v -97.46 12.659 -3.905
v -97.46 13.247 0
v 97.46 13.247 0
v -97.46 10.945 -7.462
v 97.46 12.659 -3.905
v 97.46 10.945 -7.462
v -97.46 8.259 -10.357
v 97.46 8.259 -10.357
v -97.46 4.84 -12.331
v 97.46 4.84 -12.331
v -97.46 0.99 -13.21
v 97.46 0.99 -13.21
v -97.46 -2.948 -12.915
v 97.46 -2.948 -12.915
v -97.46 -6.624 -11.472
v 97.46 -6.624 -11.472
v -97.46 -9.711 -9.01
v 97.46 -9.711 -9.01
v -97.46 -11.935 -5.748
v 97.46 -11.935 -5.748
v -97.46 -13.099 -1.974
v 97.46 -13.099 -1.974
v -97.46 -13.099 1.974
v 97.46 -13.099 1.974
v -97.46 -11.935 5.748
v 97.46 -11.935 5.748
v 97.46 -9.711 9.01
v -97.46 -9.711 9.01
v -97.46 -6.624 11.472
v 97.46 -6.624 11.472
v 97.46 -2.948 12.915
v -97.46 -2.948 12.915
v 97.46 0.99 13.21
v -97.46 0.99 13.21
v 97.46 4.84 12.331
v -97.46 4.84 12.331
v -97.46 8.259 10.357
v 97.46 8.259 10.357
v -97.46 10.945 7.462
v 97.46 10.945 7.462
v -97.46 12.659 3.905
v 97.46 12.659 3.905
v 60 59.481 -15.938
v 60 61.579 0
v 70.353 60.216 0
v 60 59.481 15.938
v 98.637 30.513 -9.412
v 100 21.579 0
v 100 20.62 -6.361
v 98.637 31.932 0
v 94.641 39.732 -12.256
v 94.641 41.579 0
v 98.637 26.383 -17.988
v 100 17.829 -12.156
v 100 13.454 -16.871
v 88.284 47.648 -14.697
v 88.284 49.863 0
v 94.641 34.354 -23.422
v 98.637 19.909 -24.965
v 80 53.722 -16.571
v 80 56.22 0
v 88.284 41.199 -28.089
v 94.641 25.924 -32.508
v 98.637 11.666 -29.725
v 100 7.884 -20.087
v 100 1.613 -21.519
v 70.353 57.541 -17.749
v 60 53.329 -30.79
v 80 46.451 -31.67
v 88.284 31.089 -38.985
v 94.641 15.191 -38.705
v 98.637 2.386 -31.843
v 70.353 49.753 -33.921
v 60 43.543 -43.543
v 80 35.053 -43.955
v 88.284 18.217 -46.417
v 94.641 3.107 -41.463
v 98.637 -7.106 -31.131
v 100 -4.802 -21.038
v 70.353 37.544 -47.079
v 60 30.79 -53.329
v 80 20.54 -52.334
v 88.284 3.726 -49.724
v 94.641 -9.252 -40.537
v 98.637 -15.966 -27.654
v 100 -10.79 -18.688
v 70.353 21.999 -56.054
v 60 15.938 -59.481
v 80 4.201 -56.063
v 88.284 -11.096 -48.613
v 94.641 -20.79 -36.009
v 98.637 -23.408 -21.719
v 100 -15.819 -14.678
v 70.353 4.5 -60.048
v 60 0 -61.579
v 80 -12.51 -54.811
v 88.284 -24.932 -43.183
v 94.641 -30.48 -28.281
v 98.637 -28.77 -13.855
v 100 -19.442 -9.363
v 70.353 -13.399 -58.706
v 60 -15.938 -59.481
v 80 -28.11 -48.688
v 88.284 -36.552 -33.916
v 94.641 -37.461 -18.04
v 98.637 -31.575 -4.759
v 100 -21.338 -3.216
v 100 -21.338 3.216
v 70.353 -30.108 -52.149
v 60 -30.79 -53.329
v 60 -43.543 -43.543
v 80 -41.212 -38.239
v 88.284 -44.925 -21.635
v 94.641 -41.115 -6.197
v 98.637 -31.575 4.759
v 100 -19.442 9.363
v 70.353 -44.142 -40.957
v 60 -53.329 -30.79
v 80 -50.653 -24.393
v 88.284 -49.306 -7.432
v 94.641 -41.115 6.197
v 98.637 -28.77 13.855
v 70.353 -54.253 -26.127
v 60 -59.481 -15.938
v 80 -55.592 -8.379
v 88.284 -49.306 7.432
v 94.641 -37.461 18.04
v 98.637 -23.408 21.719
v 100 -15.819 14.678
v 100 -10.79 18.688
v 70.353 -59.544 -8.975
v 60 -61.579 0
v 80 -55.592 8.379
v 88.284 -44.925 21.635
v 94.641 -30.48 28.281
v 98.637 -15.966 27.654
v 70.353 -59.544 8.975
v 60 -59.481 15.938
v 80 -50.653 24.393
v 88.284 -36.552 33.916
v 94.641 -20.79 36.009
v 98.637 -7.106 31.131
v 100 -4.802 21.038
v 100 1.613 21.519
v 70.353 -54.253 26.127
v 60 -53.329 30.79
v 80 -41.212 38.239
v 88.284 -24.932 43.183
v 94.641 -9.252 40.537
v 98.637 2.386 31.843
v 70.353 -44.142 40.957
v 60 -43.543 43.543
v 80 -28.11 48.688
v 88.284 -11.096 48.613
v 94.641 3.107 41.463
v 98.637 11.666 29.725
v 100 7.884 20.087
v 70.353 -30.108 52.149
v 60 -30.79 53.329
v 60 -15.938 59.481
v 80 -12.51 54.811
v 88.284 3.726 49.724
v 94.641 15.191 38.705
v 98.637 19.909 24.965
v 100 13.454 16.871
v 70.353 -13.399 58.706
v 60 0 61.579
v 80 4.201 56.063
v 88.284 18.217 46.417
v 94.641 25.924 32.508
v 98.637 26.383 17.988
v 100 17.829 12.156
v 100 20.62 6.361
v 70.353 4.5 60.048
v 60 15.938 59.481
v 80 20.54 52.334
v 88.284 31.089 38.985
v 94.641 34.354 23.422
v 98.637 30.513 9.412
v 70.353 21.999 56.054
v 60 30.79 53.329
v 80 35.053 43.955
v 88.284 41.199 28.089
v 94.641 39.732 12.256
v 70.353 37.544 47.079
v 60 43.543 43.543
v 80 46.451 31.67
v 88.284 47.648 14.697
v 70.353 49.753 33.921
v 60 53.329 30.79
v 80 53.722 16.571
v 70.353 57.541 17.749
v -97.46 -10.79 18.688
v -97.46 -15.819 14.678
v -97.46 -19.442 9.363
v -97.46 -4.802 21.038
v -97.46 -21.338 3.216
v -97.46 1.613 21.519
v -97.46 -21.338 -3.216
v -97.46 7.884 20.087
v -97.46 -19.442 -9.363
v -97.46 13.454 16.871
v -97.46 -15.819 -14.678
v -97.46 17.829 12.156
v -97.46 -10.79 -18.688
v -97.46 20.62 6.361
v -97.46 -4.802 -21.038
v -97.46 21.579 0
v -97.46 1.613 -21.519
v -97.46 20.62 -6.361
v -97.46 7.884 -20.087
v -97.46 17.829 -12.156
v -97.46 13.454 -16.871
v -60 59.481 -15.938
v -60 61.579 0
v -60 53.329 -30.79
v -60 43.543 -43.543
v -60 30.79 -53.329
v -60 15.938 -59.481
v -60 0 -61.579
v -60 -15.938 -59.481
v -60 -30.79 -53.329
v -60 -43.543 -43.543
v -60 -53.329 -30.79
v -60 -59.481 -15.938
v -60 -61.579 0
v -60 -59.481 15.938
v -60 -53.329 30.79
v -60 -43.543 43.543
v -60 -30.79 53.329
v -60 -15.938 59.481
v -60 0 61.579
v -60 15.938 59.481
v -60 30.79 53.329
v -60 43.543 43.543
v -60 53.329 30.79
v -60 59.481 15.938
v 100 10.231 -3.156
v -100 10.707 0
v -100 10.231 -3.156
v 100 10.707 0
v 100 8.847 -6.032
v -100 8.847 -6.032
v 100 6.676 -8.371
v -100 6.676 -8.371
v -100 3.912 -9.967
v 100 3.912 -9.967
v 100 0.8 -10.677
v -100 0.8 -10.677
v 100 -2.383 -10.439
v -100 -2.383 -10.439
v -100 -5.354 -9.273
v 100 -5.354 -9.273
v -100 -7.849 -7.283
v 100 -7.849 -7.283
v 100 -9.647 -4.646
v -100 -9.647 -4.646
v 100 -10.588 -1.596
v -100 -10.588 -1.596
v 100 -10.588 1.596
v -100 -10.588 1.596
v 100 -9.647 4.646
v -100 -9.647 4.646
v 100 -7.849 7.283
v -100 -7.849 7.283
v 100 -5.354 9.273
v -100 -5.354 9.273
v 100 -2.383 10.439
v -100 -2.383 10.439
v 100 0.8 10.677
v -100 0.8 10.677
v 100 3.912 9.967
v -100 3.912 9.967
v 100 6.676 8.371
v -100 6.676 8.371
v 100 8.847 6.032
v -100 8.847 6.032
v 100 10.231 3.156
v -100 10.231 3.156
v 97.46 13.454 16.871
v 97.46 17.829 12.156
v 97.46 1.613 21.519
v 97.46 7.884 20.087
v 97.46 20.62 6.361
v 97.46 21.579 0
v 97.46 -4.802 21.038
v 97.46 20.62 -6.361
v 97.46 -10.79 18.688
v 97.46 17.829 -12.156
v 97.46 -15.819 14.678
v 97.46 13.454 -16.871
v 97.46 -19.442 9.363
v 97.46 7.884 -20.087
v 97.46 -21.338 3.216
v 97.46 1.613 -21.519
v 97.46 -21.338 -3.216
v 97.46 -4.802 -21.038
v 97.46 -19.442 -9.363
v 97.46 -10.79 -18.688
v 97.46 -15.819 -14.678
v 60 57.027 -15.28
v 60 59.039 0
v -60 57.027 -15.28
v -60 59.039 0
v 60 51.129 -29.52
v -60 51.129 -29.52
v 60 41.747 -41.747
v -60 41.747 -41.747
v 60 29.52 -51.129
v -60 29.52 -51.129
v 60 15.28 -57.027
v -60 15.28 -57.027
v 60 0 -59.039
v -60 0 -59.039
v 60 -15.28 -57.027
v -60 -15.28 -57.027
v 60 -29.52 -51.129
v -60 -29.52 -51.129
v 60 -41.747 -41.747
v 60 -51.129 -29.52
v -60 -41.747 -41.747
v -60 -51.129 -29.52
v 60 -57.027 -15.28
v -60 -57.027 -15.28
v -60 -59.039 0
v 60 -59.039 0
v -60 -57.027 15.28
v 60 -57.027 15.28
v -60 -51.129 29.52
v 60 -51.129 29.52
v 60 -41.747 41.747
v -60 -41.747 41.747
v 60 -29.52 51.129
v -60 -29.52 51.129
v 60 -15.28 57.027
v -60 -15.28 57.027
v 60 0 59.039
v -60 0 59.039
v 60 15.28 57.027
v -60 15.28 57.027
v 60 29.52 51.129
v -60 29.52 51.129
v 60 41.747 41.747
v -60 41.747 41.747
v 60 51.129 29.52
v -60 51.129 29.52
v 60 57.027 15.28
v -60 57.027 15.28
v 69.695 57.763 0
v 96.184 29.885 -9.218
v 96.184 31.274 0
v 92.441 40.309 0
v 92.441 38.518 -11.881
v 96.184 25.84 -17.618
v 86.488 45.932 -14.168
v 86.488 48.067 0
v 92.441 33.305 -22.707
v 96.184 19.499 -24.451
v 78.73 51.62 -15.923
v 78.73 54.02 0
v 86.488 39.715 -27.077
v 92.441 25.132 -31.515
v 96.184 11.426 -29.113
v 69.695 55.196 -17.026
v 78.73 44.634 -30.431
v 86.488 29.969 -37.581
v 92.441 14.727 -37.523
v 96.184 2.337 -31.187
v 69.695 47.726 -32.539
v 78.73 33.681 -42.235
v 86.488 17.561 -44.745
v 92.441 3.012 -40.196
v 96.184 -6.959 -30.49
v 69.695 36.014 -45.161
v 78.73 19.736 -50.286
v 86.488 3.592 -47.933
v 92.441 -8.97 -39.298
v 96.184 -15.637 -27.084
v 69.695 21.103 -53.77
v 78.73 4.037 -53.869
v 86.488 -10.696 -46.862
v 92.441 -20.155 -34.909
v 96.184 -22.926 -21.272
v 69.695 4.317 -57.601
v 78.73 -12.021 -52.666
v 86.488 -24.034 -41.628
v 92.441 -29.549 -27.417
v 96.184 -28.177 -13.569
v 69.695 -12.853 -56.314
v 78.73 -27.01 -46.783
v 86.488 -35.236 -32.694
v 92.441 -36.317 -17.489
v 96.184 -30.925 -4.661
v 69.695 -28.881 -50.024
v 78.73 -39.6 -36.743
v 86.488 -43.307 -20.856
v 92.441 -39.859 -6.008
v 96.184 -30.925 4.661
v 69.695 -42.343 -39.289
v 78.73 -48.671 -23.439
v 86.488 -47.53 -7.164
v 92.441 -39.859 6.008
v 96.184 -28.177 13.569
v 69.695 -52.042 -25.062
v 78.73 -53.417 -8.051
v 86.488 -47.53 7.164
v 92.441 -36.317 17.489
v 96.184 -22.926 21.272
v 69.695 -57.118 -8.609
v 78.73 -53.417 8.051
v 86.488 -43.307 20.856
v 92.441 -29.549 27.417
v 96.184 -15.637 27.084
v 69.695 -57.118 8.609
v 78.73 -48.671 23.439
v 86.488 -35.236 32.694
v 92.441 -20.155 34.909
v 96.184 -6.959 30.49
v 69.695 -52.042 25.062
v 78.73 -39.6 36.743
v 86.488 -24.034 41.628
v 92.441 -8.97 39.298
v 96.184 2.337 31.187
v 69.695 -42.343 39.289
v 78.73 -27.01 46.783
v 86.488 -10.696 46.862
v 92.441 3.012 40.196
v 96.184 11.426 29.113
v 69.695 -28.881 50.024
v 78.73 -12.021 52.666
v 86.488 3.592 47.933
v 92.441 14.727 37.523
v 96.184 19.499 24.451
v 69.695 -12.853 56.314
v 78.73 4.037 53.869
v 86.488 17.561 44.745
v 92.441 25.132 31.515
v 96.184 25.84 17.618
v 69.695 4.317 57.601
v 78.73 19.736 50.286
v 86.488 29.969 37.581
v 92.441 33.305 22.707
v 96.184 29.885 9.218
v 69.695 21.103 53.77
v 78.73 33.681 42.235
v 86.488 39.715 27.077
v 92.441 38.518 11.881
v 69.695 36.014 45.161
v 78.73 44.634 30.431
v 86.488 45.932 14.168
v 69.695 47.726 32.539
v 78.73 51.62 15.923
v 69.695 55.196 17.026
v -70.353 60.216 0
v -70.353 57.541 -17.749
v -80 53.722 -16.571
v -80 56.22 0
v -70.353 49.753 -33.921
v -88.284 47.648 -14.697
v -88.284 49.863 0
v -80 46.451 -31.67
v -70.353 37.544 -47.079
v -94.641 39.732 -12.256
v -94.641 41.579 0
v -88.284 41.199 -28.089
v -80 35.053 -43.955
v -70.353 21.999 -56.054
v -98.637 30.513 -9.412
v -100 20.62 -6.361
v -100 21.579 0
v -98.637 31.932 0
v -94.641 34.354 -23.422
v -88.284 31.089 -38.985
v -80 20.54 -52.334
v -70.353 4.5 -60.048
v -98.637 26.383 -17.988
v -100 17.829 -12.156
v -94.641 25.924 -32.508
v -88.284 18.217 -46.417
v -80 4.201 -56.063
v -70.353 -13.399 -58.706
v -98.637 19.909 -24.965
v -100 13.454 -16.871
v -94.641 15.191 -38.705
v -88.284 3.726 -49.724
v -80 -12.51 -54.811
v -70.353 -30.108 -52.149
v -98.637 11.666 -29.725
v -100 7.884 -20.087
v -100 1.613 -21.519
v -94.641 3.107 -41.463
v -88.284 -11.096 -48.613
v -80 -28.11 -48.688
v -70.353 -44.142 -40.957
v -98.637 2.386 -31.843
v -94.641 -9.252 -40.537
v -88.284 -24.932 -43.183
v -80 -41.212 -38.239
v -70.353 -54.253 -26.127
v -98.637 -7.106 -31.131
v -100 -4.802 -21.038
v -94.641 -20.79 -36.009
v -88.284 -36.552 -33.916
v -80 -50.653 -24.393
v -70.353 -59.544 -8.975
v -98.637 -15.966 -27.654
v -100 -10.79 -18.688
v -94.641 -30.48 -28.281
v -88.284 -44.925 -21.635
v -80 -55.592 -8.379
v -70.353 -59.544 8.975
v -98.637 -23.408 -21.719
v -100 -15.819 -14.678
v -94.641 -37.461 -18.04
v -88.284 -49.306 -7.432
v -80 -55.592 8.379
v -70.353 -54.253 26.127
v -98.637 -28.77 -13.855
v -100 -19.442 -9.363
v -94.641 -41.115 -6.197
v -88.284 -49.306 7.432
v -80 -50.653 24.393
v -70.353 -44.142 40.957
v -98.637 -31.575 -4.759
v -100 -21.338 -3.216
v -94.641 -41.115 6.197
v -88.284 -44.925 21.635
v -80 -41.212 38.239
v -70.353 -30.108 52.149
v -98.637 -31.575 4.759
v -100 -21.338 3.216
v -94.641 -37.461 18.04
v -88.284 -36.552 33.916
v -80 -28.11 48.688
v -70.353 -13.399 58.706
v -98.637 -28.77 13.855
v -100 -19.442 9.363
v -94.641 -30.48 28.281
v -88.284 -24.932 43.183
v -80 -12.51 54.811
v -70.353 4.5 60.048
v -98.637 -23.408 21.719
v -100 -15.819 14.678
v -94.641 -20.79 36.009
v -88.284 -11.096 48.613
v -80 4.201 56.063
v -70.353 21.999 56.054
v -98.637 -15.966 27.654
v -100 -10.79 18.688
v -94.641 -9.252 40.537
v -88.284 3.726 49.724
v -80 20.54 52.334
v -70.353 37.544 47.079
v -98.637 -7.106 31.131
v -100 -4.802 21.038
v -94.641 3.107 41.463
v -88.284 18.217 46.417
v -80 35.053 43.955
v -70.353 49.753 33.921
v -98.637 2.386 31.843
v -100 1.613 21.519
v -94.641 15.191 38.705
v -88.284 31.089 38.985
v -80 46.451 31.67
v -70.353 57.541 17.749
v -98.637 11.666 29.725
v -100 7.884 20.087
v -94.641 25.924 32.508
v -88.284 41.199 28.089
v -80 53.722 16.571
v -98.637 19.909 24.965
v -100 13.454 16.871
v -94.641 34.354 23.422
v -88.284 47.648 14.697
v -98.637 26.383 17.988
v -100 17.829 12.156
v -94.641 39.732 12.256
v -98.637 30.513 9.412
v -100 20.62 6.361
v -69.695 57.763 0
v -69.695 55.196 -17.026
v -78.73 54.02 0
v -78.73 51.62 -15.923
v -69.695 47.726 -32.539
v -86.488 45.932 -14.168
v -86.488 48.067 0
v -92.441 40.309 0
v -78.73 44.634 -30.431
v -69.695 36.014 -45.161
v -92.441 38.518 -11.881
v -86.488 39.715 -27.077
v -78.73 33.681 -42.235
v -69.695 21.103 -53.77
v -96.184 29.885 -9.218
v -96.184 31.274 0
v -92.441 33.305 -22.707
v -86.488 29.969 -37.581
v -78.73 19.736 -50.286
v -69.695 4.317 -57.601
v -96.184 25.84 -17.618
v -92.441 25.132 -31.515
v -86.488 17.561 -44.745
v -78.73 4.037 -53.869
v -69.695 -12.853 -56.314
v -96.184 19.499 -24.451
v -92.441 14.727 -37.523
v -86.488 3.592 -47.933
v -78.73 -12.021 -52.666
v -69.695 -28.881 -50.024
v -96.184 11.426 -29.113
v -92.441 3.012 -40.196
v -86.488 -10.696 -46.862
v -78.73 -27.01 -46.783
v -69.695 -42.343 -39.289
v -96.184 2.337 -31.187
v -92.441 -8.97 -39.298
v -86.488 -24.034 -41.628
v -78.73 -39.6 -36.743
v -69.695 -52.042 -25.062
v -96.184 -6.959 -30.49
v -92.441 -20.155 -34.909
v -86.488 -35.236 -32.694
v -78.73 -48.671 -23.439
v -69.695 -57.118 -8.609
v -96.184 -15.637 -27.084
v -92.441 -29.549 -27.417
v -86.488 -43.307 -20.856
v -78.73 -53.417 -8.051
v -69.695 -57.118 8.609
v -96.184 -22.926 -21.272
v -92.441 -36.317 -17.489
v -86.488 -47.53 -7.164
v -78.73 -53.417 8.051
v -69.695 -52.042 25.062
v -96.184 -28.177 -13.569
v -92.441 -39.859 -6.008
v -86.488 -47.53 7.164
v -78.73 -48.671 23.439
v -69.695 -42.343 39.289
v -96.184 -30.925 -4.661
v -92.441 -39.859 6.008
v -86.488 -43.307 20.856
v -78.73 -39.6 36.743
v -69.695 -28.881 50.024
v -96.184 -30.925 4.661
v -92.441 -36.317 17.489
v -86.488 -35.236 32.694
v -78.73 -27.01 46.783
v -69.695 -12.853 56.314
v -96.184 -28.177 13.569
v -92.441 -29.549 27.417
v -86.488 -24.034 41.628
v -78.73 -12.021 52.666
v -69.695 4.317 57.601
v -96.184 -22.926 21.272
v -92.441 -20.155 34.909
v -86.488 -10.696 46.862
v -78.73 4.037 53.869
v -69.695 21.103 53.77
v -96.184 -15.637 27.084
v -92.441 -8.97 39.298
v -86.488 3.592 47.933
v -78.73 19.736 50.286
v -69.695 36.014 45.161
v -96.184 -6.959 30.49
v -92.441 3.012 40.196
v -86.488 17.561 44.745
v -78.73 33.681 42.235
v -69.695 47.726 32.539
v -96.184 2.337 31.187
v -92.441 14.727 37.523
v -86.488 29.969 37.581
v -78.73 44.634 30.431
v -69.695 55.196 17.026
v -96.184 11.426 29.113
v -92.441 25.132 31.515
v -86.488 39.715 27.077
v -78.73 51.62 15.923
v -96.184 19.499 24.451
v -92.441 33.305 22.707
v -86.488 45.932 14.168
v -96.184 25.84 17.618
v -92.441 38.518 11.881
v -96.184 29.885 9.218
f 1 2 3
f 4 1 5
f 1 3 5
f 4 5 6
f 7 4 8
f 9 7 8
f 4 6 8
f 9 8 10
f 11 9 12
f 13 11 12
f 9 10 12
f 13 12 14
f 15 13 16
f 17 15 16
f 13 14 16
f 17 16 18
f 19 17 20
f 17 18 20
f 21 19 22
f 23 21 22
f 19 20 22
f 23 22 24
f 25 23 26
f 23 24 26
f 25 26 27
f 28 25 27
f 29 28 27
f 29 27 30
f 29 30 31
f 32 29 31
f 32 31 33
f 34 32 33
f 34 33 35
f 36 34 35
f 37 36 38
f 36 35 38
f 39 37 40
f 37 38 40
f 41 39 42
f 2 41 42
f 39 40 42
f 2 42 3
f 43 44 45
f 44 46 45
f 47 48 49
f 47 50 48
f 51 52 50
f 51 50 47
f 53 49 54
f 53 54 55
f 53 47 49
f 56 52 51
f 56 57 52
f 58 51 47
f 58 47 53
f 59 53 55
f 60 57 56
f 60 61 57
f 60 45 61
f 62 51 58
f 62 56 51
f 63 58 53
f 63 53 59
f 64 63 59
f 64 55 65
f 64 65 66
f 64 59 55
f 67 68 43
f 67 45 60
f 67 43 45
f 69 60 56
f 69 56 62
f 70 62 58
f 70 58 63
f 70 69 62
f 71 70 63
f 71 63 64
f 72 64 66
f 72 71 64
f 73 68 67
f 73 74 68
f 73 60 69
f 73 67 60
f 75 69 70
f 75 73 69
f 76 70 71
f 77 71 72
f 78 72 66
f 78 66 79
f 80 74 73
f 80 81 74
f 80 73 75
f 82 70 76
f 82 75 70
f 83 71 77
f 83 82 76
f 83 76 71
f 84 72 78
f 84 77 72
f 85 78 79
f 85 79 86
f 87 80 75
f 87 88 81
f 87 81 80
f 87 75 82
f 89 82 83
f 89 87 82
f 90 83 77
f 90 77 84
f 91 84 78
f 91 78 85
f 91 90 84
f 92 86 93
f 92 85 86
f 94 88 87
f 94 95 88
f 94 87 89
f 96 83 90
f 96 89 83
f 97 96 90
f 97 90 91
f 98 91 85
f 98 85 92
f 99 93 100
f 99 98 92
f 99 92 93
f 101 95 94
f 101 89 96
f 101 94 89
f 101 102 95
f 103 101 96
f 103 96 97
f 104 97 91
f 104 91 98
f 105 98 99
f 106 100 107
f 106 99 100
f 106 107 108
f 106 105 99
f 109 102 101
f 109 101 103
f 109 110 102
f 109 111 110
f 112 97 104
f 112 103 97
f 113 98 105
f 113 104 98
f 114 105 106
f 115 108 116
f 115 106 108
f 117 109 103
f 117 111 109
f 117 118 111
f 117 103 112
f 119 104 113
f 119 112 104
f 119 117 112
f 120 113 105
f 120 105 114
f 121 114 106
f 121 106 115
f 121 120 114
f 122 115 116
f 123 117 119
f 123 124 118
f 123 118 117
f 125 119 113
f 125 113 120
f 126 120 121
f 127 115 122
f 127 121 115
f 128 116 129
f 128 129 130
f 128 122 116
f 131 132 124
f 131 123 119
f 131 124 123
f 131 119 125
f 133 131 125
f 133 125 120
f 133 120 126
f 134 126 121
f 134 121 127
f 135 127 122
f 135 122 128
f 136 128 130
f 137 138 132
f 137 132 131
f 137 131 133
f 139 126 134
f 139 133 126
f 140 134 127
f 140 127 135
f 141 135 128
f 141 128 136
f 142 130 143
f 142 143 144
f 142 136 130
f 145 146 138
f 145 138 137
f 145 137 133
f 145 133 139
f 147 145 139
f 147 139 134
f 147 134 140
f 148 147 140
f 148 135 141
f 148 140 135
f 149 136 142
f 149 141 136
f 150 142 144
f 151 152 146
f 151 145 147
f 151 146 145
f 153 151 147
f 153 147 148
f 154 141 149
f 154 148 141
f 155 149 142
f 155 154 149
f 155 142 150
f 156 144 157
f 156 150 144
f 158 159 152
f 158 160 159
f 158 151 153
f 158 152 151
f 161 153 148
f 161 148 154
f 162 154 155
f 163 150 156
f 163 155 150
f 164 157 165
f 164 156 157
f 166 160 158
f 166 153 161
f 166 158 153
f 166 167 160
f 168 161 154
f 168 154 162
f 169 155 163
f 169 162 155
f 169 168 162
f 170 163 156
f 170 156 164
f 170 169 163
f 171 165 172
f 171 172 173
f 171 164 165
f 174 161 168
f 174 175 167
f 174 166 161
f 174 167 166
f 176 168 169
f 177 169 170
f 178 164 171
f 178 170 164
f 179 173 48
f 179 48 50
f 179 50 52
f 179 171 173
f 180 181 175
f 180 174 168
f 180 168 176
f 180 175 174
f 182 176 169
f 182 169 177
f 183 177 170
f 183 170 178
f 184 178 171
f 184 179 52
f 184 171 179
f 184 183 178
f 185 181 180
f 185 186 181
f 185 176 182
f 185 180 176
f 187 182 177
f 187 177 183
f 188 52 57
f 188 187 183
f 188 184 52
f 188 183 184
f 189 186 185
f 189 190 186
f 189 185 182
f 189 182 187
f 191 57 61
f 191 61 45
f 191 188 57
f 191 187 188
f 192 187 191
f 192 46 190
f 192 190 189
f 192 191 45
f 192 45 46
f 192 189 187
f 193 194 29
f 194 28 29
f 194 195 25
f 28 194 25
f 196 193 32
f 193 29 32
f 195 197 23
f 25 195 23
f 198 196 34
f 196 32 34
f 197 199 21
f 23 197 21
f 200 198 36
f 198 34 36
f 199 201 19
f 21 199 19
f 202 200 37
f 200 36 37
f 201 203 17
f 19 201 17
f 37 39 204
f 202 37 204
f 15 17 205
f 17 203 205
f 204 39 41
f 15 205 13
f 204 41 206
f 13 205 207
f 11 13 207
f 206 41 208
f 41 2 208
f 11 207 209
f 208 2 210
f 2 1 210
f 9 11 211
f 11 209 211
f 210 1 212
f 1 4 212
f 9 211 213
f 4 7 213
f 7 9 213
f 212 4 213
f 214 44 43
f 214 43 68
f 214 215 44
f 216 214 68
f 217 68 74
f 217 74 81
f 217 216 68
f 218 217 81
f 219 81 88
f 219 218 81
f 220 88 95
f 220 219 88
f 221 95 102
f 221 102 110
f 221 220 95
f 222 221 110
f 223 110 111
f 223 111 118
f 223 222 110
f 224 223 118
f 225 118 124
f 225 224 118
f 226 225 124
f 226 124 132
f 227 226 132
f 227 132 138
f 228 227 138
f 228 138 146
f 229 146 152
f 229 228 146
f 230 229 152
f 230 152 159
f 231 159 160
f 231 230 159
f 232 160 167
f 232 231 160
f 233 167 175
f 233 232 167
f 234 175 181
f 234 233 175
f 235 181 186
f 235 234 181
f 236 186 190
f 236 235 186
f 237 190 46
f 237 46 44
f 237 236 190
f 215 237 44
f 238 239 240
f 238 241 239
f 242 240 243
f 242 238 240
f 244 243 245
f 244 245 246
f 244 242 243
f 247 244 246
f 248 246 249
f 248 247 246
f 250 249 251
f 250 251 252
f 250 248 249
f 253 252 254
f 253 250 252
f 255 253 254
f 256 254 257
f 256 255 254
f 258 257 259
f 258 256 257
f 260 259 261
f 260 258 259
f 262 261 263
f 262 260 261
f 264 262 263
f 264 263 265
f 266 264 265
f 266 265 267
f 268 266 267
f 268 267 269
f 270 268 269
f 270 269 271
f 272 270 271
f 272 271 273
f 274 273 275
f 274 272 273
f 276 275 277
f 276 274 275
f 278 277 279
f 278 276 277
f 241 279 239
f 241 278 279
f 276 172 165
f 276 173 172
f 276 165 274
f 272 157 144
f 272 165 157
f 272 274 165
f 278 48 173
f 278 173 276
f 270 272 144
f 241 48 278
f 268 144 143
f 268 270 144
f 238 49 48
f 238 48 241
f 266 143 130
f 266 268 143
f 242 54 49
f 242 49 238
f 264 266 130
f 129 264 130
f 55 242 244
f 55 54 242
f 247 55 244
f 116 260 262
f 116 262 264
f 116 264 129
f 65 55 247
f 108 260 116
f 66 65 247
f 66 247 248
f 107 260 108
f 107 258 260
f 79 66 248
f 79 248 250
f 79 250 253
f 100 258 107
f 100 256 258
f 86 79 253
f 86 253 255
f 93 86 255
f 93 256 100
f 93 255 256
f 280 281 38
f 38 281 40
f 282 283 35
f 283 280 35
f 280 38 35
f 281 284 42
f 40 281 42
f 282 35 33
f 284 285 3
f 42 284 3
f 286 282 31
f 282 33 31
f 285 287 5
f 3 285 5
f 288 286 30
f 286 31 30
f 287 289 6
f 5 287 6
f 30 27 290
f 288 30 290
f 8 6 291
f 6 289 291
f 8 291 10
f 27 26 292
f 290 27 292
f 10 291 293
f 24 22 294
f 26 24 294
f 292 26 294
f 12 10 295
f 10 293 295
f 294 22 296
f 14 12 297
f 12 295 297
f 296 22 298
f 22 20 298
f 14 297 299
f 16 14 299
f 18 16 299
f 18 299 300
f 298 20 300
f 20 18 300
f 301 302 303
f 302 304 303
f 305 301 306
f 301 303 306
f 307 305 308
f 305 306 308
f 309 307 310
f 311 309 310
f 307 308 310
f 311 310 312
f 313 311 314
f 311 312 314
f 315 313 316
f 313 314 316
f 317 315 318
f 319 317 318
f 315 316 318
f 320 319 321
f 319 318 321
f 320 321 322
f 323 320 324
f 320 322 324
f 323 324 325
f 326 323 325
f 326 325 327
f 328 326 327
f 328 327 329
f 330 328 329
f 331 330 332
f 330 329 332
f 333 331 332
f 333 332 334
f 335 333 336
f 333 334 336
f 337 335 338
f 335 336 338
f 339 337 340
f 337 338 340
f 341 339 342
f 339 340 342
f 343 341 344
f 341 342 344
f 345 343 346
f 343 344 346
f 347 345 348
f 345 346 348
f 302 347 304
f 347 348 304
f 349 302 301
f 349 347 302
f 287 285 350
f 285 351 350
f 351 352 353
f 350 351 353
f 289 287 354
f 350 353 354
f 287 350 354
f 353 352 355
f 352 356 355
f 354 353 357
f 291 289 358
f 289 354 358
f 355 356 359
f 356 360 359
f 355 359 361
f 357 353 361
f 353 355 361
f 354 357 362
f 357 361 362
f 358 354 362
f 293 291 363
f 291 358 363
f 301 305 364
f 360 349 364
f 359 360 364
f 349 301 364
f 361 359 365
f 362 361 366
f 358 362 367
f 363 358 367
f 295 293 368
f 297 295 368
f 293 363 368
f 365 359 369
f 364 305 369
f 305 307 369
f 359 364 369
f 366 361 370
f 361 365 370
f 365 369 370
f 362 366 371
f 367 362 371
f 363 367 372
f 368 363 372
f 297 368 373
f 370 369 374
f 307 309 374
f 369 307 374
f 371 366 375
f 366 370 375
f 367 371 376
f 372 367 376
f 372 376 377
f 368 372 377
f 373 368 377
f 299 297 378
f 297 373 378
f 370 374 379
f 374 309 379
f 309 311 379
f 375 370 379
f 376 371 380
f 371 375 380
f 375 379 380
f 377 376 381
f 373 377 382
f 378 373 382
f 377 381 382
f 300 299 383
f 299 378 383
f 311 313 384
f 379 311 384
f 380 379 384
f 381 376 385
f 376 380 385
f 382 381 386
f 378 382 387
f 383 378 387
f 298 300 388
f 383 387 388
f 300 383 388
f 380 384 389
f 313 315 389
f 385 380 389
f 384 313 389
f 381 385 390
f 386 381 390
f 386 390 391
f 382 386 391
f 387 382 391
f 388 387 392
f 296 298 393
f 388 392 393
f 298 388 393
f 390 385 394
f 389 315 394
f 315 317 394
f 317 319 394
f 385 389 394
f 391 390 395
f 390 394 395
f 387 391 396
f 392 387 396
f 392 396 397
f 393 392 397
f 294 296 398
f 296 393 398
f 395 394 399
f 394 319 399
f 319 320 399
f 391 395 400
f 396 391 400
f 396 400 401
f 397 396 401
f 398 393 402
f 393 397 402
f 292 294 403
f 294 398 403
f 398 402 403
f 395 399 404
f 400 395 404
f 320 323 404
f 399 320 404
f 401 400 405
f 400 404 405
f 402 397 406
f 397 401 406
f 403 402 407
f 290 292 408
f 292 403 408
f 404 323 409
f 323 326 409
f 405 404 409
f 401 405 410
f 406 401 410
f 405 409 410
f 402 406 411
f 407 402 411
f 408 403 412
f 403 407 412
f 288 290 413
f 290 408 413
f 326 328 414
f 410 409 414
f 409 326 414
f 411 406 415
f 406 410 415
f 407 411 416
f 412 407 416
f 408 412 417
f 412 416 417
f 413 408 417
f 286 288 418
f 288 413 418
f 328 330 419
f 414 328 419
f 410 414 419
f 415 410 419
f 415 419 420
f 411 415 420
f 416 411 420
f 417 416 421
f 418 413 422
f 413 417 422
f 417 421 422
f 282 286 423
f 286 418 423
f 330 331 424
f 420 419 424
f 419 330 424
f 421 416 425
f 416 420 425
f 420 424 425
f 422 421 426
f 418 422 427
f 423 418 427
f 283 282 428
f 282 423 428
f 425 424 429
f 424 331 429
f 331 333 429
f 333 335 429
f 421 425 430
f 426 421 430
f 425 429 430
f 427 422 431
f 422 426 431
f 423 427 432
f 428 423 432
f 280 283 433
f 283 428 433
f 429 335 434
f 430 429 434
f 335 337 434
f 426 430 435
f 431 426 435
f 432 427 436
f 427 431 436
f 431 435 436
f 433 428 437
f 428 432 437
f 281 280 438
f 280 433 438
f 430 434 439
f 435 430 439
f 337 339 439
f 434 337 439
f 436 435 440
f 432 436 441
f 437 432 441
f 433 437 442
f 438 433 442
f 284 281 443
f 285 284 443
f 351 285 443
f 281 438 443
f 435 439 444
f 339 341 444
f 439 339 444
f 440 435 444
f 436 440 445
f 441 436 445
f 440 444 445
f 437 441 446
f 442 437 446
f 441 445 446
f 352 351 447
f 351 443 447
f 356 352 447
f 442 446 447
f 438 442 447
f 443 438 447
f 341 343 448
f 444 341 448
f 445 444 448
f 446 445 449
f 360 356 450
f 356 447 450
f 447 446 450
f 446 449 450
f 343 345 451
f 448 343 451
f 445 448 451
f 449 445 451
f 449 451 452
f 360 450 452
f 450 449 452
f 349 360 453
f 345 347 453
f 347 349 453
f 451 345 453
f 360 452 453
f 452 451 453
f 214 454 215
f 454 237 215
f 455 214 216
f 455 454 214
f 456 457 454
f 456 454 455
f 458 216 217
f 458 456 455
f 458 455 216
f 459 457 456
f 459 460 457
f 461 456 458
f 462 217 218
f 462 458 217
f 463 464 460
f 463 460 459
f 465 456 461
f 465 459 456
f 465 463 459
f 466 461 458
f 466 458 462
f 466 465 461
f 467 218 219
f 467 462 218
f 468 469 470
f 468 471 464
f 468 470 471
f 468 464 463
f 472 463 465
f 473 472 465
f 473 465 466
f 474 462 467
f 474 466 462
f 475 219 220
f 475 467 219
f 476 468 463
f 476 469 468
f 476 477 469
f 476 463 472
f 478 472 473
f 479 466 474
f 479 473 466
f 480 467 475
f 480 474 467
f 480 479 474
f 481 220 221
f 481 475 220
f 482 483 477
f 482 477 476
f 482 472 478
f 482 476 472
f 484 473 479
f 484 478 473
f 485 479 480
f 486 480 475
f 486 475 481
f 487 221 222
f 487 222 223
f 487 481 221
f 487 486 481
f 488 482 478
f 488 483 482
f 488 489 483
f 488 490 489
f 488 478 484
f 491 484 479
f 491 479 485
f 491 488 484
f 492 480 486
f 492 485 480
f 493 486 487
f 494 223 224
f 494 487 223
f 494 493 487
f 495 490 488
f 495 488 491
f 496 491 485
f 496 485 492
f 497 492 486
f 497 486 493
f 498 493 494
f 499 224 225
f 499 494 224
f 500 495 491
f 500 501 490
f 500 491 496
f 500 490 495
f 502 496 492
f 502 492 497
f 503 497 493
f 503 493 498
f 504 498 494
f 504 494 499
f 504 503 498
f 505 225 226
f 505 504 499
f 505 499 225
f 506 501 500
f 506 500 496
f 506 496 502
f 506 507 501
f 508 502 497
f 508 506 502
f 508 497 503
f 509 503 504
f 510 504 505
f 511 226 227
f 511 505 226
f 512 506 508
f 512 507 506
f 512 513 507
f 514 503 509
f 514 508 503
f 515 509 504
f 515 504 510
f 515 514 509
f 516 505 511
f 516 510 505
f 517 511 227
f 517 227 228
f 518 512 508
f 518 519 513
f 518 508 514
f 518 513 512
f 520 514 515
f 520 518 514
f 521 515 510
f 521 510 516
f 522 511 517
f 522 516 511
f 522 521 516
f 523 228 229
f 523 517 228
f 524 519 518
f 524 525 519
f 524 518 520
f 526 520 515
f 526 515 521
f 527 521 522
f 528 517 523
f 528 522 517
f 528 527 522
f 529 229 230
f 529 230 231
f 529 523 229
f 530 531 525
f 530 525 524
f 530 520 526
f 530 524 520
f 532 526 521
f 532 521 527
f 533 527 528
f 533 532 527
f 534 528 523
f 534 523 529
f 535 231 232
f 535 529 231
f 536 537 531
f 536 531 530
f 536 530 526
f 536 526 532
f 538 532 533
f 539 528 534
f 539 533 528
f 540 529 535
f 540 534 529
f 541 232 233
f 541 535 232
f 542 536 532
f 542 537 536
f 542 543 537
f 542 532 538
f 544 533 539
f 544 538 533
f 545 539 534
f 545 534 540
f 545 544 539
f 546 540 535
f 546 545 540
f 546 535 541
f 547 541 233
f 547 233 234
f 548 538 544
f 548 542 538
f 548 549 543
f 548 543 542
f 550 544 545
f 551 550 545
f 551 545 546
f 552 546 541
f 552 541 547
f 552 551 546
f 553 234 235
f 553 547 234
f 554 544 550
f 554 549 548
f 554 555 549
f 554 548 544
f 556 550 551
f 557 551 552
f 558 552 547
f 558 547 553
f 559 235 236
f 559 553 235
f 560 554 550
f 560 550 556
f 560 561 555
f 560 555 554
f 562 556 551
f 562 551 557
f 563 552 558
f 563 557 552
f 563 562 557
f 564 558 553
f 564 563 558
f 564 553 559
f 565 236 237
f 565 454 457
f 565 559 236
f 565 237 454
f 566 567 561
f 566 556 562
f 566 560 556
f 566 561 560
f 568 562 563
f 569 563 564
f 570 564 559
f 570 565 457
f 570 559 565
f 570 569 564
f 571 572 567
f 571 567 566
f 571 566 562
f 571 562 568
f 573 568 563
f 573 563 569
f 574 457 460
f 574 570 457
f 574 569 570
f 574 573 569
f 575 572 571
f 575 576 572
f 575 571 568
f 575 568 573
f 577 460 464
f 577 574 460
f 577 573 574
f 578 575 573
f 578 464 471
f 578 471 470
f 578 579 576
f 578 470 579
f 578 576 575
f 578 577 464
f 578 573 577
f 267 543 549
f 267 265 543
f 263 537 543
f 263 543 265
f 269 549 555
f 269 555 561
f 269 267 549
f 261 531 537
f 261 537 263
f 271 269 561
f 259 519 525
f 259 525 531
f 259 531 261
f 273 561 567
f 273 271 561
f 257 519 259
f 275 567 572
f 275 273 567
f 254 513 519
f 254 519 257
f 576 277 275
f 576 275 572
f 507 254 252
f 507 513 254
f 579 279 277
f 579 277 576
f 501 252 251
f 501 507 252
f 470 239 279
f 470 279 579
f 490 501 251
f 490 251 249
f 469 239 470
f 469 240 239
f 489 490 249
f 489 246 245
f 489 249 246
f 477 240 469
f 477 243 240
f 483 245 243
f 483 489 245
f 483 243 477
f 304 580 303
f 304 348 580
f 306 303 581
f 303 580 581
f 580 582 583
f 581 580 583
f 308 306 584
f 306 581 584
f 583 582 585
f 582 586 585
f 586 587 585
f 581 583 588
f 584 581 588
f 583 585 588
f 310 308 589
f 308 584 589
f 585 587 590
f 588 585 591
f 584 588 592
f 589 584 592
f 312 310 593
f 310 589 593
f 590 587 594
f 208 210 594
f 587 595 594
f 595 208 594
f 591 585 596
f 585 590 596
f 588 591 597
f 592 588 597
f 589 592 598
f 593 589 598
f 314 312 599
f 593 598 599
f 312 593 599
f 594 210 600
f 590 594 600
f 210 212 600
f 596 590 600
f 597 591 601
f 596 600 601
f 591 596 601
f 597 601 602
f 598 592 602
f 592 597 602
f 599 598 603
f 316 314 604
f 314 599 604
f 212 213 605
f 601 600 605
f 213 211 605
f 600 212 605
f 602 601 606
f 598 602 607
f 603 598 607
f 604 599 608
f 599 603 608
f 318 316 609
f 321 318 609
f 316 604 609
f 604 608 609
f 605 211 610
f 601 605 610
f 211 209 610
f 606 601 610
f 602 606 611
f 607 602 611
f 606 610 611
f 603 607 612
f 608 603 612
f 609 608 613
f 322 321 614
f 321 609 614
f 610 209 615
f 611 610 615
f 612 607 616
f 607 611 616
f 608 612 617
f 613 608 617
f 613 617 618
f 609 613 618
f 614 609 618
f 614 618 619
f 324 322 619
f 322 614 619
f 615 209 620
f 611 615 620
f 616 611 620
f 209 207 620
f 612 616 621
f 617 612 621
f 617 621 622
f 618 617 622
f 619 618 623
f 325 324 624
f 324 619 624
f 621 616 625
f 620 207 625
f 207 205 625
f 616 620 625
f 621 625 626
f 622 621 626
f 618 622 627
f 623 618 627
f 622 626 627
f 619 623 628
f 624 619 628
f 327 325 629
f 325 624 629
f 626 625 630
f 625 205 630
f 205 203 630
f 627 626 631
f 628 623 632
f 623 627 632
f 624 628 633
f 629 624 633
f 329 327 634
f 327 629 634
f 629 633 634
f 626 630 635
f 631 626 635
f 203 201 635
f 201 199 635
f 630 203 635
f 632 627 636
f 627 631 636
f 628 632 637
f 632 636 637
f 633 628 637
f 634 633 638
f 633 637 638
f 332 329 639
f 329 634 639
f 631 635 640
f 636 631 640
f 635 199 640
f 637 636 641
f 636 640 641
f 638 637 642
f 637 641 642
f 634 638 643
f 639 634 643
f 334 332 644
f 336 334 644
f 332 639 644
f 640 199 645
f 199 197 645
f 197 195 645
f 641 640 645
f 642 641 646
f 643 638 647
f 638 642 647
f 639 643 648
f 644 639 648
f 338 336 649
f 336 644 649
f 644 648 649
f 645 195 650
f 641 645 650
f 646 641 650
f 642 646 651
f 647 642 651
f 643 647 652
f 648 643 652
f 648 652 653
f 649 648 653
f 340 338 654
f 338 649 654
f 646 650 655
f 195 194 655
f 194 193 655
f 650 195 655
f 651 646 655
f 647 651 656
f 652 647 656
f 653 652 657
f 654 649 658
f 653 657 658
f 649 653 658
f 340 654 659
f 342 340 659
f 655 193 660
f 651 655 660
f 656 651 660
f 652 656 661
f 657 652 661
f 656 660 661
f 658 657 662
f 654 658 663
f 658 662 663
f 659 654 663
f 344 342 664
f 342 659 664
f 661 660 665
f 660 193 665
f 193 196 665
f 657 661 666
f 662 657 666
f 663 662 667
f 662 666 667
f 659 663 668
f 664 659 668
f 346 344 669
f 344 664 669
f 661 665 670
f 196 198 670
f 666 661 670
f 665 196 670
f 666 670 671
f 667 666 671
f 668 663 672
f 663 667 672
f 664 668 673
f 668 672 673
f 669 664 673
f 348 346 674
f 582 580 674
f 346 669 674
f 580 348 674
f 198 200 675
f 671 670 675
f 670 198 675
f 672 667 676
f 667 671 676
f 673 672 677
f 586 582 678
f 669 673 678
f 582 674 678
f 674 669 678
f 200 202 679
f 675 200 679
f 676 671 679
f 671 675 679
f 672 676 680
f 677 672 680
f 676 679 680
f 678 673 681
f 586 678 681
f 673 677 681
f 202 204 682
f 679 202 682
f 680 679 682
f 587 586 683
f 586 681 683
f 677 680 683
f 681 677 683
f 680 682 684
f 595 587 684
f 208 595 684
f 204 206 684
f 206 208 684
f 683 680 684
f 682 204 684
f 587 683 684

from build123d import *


with BuildPart() as part:
    # Sketch1 → Revolve1 (revolve)
    with BuildSketch(Plane.XY):
        with BuildLine():
            Line((-100, 21.579100204), (-100, 10.707094489))
            Line((-100, 10.707094489), (100, 10.707094489))
            Line((100, 10.707094489), (100, 21.579100204))
            ThreePointArc((100, 21.579100204), (88.284271247, 49.863371451), (60, 61.579100204))
            Line((60, 61.579100204), (-60, 61.579100204))
            ThreePointArc((-60, 61.579100204), (-88.284271247, 49.863371451), (-100, 21.579100204))
        make_face()
        with BuildLine():
            Line((-97.46, 21.579100204), (-97.46, 13.247094489))
            Line((-97.46, 13.247094489), (97.46, 13.247094489))
            Line((97.46, 13.247094489), (97.46, 21.579100204))
            ThreePointArc((97.46, 21.579100204), (86.488220023, 48.067320227), (60, 59.039100204))
            Line((60, 59.039100204), (-60, 59.039100204))
            ThreePointArc((-60, 59.039100204), (-86.488220023, 48.067320227), (-97.46, 21.579100204))
        make_face(mode=Mode.SUBTRACT)
    revolve(axis=Axis((0, 0, 0), (-1, 0, 0)))


solid = part.part
